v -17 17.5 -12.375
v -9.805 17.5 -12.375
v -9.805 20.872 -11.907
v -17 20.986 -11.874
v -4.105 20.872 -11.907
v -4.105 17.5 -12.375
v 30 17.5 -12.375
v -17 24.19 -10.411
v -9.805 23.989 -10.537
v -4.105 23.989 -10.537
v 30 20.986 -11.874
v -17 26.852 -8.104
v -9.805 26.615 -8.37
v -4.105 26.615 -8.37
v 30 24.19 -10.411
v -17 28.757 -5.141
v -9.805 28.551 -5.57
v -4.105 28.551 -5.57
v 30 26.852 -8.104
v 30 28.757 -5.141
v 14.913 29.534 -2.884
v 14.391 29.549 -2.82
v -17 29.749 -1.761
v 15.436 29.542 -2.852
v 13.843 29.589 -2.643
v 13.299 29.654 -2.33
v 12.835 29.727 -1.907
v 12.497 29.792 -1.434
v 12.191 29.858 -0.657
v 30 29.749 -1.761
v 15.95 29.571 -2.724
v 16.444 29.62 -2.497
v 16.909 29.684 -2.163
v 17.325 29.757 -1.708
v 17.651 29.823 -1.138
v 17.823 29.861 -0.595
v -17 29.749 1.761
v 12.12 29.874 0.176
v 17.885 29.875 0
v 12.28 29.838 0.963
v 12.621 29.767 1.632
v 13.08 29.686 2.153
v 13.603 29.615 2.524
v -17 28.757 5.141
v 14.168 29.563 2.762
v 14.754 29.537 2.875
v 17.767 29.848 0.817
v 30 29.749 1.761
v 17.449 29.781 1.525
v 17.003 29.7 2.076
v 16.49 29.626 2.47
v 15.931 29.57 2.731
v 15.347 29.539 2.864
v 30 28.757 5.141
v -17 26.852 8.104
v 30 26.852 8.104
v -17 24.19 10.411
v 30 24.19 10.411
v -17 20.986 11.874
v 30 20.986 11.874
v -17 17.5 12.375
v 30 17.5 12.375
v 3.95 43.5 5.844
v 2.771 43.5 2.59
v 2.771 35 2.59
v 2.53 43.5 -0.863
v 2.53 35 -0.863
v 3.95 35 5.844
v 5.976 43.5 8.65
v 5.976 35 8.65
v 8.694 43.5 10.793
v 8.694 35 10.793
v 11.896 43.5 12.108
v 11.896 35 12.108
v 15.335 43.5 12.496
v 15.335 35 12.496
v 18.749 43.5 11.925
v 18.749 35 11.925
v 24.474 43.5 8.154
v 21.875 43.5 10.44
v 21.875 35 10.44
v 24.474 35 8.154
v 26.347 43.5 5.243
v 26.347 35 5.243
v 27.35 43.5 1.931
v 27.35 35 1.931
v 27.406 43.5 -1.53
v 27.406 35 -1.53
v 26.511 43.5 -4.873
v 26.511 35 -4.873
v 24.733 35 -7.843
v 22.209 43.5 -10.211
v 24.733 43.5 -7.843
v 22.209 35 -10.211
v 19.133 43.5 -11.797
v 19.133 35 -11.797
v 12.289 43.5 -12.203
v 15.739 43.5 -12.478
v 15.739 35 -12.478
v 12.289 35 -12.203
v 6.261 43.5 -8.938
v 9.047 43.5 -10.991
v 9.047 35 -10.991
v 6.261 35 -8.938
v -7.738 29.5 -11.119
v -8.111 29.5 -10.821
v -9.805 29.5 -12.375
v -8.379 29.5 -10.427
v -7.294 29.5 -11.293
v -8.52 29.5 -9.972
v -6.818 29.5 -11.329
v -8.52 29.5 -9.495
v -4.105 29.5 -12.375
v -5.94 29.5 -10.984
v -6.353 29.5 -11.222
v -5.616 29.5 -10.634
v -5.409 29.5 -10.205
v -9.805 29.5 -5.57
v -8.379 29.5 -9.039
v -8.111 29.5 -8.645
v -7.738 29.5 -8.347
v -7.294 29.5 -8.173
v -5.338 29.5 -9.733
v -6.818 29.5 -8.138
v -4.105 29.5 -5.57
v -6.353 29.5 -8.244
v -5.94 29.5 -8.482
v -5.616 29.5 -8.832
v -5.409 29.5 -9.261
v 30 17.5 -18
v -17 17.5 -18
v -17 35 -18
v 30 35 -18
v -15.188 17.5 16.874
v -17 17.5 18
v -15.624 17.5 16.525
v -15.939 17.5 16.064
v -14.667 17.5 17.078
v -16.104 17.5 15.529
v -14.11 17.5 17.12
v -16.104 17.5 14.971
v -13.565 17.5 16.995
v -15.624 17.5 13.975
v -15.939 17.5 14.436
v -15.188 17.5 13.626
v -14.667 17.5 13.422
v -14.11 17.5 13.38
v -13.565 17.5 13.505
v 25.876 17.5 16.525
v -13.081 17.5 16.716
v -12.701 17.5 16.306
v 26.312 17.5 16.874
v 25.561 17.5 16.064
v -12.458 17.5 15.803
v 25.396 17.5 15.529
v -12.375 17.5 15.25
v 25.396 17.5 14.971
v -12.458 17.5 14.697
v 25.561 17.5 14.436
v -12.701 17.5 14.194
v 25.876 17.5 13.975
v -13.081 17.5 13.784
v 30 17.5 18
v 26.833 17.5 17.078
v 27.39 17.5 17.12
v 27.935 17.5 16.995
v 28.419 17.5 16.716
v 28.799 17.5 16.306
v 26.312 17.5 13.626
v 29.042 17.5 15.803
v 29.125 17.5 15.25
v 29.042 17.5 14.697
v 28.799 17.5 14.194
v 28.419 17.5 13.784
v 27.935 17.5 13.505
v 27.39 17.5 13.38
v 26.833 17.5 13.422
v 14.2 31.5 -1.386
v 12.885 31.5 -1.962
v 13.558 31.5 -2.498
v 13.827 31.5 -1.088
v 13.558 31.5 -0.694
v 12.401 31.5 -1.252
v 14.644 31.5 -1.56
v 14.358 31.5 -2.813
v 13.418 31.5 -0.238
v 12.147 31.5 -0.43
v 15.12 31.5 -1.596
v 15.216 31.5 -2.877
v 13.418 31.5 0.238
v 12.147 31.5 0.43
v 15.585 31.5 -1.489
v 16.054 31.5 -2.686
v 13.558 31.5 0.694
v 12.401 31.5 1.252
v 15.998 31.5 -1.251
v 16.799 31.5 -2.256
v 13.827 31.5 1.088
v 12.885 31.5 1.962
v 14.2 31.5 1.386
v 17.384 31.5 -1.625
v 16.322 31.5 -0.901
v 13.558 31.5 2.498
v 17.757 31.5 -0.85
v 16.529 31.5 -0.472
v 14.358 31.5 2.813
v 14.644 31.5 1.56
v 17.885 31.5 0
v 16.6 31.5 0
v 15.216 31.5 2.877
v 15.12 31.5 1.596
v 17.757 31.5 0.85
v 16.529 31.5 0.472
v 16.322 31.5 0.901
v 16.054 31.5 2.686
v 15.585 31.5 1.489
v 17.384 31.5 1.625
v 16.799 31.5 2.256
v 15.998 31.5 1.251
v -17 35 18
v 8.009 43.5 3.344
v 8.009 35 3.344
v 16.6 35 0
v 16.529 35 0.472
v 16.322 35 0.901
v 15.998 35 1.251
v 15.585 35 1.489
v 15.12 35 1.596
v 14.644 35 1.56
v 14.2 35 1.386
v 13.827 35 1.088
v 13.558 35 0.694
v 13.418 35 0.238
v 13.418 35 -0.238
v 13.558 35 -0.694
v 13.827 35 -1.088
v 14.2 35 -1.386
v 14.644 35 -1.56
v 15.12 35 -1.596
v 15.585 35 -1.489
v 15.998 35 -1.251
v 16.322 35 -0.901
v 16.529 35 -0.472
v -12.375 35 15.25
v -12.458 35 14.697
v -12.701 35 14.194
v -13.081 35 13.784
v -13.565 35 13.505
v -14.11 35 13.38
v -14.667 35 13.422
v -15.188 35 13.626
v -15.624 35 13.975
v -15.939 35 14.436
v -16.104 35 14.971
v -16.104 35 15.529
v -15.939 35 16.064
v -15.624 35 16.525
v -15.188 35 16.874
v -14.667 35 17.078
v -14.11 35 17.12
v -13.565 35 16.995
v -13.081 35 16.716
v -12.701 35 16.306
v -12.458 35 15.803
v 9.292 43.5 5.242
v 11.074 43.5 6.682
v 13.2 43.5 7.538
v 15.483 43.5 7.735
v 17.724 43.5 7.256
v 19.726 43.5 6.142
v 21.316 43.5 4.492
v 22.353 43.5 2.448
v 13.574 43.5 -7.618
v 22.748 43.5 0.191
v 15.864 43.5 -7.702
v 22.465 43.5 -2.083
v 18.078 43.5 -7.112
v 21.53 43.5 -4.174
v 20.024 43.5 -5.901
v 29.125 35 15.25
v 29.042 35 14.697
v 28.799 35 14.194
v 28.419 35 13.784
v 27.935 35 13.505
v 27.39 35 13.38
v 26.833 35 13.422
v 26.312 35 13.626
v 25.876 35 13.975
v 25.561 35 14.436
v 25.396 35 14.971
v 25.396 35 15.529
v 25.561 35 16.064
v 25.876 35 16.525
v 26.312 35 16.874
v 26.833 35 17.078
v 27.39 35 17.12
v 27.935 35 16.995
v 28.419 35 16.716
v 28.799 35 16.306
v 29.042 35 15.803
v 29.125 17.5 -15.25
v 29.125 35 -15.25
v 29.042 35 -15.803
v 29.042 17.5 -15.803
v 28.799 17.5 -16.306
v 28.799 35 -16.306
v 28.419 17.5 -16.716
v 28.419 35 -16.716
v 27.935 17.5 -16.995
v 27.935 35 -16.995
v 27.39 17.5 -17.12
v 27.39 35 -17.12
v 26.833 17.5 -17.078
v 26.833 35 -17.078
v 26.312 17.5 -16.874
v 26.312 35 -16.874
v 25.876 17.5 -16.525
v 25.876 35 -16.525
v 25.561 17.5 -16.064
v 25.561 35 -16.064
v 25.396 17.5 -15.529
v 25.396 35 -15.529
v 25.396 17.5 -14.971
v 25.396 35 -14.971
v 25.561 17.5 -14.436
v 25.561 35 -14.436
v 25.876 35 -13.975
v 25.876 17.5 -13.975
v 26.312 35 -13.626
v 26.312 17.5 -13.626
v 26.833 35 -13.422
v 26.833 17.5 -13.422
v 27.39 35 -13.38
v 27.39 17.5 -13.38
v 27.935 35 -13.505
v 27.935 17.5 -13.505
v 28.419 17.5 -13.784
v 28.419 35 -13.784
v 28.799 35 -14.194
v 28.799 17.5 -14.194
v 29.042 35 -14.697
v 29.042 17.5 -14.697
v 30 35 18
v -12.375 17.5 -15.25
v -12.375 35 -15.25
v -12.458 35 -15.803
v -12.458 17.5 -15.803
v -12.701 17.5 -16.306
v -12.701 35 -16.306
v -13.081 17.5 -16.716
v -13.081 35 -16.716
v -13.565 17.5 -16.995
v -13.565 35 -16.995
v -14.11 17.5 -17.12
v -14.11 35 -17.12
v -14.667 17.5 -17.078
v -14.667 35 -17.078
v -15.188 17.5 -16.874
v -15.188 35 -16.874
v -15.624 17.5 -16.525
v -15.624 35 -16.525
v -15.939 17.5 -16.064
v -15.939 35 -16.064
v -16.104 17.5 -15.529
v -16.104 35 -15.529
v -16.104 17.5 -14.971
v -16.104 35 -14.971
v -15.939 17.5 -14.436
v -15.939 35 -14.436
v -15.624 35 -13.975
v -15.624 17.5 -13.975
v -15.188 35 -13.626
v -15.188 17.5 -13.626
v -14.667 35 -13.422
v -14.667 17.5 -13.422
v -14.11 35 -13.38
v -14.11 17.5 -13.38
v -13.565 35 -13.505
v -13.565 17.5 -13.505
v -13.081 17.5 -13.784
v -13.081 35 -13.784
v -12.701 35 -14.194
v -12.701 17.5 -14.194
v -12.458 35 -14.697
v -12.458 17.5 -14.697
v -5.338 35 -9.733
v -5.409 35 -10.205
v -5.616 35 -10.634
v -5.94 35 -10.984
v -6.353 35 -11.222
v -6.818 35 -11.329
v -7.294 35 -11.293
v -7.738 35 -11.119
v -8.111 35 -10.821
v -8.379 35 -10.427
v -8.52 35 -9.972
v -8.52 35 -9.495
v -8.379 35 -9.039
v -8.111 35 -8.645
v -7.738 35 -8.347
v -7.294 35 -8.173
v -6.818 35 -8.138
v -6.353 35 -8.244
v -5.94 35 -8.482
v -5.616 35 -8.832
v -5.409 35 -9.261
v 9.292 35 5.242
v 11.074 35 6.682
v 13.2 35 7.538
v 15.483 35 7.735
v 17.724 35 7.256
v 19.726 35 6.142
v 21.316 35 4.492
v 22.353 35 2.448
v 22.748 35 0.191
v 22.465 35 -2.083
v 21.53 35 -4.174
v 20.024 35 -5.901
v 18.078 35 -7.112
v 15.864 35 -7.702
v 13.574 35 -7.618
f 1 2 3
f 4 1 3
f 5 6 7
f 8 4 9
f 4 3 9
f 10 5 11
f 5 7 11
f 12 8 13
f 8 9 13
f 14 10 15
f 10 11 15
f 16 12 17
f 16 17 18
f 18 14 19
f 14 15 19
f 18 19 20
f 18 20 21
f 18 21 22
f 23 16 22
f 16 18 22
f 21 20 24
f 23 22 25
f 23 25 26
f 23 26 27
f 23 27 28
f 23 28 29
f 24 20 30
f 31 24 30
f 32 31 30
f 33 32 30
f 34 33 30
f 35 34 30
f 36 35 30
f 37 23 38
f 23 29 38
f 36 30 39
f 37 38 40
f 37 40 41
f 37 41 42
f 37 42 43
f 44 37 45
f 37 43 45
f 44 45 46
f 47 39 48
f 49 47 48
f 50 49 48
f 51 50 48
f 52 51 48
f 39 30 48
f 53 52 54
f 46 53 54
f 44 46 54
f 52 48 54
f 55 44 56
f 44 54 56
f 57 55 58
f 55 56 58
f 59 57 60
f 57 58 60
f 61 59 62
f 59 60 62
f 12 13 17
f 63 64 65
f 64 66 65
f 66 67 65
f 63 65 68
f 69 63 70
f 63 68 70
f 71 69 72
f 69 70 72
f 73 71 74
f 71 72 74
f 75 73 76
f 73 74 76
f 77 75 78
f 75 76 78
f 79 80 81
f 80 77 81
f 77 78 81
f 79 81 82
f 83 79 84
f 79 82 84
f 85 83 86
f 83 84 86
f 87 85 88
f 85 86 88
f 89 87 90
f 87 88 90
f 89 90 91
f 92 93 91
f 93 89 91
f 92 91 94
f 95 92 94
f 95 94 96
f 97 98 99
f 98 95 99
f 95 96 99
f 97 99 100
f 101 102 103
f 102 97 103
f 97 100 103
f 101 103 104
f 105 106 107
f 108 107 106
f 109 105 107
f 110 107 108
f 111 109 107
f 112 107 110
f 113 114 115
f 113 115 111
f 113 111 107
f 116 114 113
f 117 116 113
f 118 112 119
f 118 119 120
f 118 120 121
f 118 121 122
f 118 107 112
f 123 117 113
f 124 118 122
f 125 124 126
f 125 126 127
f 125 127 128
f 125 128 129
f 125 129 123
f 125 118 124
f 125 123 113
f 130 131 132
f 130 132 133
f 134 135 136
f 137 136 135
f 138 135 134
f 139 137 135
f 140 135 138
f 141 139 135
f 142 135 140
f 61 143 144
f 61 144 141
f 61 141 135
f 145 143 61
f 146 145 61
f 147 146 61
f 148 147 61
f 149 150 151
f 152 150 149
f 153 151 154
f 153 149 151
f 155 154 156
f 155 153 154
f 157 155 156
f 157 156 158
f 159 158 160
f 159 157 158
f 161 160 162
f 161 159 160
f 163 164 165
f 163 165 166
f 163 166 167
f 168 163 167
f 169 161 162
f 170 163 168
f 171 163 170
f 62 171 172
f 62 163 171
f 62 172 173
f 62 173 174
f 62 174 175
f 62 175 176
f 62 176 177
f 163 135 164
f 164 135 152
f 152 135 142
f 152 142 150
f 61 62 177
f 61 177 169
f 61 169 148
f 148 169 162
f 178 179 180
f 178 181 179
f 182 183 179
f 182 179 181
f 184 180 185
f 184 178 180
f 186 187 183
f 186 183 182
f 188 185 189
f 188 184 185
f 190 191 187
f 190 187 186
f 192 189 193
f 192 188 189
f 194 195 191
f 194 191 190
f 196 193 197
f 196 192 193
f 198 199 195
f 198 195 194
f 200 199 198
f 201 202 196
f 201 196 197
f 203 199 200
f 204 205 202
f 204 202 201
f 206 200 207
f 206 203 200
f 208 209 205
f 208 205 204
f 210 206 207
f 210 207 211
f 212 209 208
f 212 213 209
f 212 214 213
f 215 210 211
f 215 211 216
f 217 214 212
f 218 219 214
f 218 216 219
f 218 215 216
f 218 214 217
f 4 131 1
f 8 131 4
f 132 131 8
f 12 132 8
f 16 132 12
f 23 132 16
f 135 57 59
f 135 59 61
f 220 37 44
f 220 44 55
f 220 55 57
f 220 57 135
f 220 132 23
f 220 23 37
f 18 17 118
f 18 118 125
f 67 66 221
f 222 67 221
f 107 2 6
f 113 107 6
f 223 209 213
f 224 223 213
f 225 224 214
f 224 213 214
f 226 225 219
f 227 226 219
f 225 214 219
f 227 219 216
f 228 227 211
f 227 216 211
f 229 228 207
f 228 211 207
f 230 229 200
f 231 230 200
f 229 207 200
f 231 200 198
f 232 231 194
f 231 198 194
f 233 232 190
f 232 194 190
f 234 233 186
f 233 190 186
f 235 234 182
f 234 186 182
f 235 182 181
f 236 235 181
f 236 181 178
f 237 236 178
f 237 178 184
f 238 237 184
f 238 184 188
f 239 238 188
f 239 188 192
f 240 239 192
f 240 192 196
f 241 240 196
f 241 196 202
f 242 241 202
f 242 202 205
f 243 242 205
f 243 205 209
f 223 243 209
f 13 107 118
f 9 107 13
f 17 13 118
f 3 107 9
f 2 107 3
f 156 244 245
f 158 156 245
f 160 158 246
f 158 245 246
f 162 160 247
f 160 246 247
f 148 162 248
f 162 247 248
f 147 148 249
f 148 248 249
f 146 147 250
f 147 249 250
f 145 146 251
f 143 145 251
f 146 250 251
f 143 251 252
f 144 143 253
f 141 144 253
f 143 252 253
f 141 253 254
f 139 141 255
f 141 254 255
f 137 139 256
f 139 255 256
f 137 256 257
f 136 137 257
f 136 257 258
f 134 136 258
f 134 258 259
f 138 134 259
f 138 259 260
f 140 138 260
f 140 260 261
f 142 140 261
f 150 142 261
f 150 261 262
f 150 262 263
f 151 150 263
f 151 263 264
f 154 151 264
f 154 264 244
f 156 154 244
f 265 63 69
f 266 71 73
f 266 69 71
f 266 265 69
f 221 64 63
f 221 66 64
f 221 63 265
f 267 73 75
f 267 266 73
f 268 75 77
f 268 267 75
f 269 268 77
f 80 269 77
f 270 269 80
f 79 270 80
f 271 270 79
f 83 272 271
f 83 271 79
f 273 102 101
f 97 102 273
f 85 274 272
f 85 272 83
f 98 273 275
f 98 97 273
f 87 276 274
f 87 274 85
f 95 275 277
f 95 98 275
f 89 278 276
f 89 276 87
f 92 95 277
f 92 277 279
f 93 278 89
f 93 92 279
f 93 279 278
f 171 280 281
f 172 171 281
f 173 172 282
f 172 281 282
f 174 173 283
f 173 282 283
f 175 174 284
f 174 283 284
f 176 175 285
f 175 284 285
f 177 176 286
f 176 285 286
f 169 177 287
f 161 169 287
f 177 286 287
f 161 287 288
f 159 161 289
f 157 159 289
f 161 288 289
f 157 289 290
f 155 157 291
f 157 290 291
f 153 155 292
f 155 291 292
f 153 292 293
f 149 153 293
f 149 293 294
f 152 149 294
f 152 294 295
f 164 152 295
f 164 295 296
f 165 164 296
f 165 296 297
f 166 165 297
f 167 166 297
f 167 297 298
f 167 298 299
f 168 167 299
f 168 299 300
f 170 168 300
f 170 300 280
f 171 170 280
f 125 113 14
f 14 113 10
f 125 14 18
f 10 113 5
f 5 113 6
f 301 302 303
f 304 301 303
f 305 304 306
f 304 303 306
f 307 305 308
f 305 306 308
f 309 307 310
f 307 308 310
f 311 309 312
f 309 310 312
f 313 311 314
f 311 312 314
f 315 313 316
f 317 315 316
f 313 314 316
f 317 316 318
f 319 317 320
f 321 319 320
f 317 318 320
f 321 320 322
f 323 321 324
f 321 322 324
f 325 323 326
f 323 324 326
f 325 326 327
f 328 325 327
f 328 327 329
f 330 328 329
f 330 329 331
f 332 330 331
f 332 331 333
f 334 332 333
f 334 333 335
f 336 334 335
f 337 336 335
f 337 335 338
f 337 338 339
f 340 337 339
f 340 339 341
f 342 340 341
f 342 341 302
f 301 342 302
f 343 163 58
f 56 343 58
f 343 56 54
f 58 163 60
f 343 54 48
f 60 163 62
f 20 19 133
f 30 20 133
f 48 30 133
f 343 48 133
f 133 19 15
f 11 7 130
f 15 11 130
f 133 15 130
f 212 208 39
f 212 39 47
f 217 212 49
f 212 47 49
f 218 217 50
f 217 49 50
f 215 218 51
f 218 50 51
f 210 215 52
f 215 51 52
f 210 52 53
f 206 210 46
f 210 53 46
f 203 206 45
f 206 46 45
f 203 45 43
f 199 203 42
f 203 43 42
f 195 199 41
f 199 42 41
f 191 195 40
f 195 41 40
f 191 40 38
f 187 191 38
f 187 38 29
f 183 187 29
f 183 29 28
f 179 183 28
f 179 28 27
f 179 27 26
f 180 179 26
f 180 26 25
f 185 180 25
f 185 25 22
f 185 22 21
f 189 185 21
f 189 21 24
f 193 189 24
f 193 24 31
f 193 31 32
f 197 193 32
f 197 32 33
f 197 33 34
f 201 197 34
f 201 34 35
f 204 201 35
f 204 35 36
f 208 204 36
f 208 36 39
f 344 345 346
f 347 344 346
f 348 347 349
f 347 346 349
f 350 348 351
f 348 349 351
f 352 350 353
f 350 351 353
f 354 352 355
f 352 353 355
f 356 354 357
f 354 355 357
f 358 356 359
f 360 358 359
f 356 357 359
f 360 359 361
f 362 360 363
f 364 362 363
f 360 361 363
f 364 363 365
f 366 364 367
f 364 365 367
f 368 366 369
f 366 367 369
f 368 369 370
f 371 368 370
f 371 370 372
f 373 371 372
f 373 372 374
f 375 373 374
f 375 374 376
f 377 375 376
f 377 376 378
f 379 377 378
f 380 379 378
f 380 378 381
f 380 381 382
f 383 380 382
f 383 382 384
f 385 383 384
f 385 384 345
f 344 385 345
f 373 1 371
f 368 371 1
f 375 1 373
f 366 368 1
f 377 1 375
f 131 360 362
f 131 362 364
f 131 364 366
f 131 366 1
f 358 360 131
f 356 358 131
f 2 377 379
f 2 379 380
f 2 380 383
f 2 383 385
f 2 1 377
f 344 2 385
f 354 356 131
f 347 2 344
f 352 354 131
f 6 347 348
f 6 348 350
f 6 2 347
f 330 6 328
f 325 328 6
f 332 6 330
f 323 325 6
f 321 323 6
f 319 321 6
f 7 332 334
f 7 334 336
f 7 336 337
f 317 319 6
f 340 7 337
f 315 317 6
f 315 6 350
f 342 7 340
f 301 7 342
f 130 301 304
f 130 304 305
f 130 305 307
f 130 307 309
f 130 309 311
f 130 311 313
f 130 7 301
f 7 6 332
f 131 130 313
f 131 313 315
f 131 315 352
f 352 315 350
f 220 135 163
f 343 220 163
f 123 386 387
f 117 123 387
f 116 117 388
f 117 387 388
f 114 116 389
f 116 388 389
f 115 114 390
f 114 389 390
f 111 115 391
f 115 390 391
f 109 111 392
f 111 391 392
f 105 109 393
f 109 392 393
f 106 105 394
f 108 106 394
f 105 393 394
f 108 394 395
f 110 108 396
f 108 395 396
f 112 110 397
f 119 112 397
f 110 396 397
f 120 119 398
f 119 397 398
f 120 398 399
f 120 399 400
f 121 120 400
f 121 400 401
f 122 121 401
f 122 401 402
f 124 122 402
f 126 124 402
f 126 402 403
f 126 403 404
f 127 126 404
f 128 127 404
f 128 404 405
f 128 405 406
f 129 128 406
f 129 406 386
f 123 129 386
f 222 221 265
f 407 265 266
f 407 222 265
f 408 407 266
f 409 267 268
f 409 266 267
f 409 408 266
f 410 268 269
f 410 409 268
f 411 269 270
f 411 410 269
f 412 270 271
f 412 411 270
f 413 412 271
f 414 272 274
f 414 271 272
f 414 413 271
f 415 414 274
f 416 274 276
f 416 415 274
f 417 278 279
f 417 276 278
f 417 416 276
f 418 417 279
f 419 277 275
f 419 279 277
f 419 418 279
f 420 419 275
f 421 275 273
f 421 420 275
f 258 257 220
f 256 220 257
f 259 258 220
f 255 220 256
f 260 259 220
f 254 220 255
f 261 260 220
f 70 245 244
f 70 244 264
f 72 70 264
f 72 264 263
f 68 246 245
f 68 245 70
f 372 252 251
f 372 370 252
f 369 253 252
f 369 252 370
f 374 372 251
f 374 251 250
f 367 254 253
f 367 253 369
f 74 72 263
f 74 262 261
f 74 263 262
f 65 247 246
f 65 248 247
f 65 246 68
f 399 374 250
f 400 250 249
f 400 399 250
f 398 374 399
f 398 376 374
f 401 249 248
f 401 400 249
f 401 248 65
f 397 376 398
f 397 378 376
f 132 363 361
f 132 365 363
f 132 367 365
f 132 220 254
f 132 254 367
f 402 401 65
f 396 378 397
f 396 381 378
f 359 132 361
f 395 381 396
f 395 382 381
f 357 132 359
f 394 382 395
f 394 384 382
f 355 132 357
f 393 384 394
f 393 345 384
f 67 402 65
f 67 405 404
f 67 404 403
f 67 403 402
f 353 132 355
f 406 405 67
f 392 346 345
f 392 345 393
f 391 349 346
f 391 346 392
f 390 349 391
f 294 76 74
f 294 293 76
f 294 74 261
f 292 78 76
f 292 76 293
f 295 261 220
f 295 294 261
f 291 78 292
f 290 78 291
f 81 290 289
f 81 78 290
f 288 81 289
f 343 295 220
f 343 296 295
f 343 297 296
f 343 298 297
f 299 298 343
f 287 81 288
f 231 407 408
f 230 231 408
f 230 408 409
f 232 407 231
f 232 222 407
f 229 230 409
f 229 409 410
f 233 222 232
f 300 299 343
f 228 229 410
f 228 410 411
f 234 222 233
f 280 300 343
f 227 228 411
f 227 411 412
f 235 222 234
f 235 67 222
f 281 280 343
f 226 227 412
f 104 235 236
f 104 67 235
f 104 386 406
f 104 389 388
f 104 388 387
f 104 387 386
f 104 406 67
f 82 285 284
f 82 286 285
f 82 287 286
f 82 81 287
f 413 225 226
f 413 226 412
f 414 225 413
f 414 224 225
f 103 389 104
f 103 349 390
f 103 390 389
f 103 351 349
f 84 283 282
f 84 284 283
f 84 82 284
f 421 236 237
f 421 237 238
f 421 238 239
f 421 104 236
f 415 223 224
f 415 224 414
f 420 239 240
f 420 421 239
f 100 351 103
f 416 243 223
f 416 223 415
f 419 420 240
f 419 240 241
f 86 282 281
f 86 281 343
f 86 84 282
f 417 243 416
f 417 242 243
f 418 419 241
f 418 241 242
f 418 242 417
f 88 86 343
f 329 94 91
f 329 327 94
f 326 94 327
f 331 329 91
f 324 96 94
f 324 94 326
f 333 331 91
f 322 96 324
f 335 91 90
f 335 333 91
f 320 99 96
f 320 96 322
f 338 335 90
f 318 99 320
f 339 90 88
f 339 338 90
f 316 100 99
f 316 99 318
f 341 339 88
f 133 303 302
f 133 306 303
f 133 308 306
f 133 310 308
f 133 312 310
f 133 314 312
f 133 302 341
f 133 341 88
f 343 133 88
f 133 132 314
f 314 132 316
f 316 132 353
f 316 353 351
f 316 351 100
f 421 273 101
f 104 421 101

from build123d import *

# Parameters (mm, degrees)
SKETCH1_W           = 60
SKETCH1_H           = 36
BOSS_EXTRUDE1_DEPTH = 35
SKETCH3_R           = 12.375
CUT_EXTRUDE1_DEPTH  = 61
SKETCH5_R           = 1.875
CUT_EXTRUDE2_DEPTH  = 40
CUT_EXTRUDE3_START  = 30
SKETCH7_W           = 36
SKETCH7_H           = 17.5
CUT_EXTRUDE3_DEPTH  = 61
SKETCH19_R          = 2.885
CUT_EXTRUDE13_DEPTH = 14
SKETCH20_R          = 1.6
CUT_EXTRUDE14_DEPTH = 13
SKETCH21_R          = 1.6
CUT_EXTRUDE15_DEPTH = 18.5000001
SKETCH22_W          = 5.7
SKETCH22_H          = 6.805143355
CUT_EXTRUDE16_DEPTH = 12
SKETCH23_R          = 12.5
SKETCH23_R_2        = 7.75
BOSS_EXTRUDE2_DEPTH = 8.5
CUT_EXTRUDE17_DEPTH = 8.5
SKETCH25_W          = 40.384912637
SKETCH25_H          = 20.483413903
CUT_EXTRUDE18_DEPTH = 13


with BuildPart() as part:
    # Sketch1 → Boss-Extrude1 (new body)
    with BuildSketch(Plane(origin=(0, 0, 0), x_dir=(1, 0, 0), z_dir=(0, 1, 0))):
        Rectangle(SKETCH1_W, SKETCH1_H)
    extrude(amount=BOSS_EXTRUDE1_DEPTH)

    # Sketch3 → Cut-Extrude1 (cut, through all)
    with BuildSketch(Plane(origin=(30, 0, 0), x_dir=(0, 0, -1), z_dir=(1, 0, 0))):
        with Locations((0, 17.5)):
            Circle(SKETCH3_R)
    extrude(amount=-CUT_EXTRUDE1_DEPTH, mode=Mode.SUBTRACT)

    # Sketch5 → Cut-Extrude2 (cut)
    with BuildSketch(Plane(origin=(0, 35, 0), x_dir=(1, 0, 0), z_dir=(0, 1, 0))):
        with Locations((27.25, -15.25)):
            Circle(SKETCH5_R)
        with Locations((27.25, 15.25)):
            Circle(SKETCH5_R)
        with Locations((-14.25, -15.25)):
            Circle(SKETCH5_R)
        with Locations((-14.25, 15.25)):
            Circle(SKETCH5_R)
    extrude(amount=-CUT_EXTRUDE2_DEPTH, mode=Mode.SUBTRACT)

    # Sketch7 → Cut-Extrude3 (cut, through all)
    with BuildSketch(Plane(origin=(0, 0, 0), x_dir=(0, 0, -1), z_dir=(1, 0, 0)).offset(CUT_EXTRUDE3_START)):
        with Locations((0, 8.75)):
            Rectangle(SKETCH7_W, SKETCH7_H)
    extrude(amount=-CUT_EXTRUDE3_DEPTH, mode=Mode.SUBTRACT)

    # Sketch19 → Cut-Extrude13 (cut)
    with BuildSketch(Plane.XZ.offset(-17.5)):
        with Locations((15, 0)):
            Circle(SKETCH19_R)
    extrude(amount=-CUT_EXTRUDE13_DEPTH, mode=Mode.SUBTRACT)

    # Sketch20 → Cut-Extrude14 (cut)
    with BuildSketch(Plane.XZ.offset(-31.5)):
        with Locations((15, 0)):
            Circle(SKETCH20_R)
    extrude(amount=-CUT_EXTRUDE14_DEPTH, mode=Mode.SUBTRACT)

    # Sketch21 → Cut-Extrude15 (cut, through all)
    with BuildSketch(Plane(origin=(0, 35, 0), x_dir=(1, 0, 0), z_dir=(0, 1, 0))):
        with Locations((-6.937800687, 9.733082811)):
            Circle(SKETCH21_R)
    extrude(amount=-CUT_EXTRUDE15_DEPTH, mode=Mode.SUBTRACT)

    # Sketch22 → Cut-Extrude16 (cut)
    with BuildSketch(Plane.XZ.offset(-17.5)):
        with Locations((-6.954606202, -8.972428323)):
            Rectangle(SKETCH22_W, SKETCH22_H)
    extrude(amount=-CUT_EXTRUDE16_DEPTH, mode=Mode.SUBTRACT)

    # Sketch23 → Boss-Extrude2 (add)
    with BuildSketch(Plane(origin=(0, 35, 0), x_dir=(1, 0, 0), z_dir=(0, 1, 0))):
        with Locations((15, 0)):
            Circle(SKETCH23_R)
        with Locations((15, 0)):
            Circle(SKETCH23_R_2, mode=Mode.SUBTRACT)
    extrude(amount=BOSS_EXTRUDE2_DEPTH)

    # Sketch24 → Cut-Extrude17 (cut)
    with BuildSketch(Plane(origin=(0, 43.5, 0), x_dir=(1, 0, 0), z_dir=(0, 1, 0))):
        Polygon((-6.937800687, 8.133082811), (13.574185936, -7.617713191), (13.574185936, 7.617713191), (-6.317460524, 11.207931305), align=None)
    extrude(amount=-CUT_EXTRUDE17_DEPTH, mode=Mode.SUBTRACT)

    # Sketch25 → Cut-Extrude18 (cut)
    with BuildSketch(Plane.ZY.offset(30)):
        with Locations((-0.290957584, 25.898615679)):
            Rectangle(SKETCH25_W, SKETCH25_H)
    extrude(amount=-CUT_EXTRUDE18_DEPTH, mode=Mode.SUBTRACT)


solid = part.part
